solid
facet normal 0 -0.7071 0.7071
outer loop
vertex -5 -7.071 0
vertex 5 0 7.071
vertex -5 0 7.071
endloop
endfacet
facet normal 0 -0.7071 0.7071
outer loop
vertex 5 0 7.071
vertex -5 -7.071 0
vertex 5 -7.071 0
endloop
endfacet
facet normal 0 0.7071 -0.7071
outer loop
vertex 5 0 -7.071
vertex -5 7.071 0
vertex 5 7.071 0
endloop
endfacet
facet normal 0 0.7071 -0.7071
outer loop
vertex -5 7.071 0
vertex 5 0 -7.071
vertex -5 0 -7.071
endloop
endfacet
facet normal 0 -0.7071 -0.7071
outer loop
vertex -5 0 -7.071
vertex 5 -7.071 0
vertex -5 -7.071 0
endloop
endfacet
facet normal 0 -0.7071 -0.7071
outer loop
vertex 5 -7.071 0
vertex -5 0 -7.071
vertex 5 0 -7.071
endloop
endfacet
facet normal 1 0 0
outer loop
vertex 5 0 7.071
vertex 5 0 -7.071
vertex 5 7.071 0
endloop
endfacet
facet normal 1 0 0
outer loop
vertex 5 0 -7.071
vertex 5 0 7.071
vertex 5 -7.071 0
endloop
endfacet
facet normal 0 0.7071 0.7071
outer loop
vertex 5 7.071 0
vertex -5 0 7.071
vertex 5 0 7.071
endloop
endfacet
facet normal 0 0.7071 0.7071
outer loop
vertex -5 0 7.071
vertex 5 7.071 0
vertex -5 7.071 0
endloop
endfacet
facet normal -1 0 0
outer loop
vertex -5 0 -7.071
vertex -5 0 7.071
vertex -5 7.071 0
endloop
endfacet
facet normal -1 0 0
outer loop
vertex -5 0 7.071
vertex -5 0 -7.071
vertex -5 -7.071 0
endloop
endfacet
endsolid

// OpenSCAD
// Cube 10x10x10mm
cube(10);
// Cube 10x10x10mm (zentriert)
cube(10,true);
// Quader 30x20x10mm (zentriert)
cube([30,20,10],true);
// Cube 10x10x10mm an Position 10,0,5
translate([10,0,5]) cube(10);
// Cube 10x10x10mm rotiert um 45° x-Achse (zentriert)
!rotate([45,0,0]) cube(10,true);
